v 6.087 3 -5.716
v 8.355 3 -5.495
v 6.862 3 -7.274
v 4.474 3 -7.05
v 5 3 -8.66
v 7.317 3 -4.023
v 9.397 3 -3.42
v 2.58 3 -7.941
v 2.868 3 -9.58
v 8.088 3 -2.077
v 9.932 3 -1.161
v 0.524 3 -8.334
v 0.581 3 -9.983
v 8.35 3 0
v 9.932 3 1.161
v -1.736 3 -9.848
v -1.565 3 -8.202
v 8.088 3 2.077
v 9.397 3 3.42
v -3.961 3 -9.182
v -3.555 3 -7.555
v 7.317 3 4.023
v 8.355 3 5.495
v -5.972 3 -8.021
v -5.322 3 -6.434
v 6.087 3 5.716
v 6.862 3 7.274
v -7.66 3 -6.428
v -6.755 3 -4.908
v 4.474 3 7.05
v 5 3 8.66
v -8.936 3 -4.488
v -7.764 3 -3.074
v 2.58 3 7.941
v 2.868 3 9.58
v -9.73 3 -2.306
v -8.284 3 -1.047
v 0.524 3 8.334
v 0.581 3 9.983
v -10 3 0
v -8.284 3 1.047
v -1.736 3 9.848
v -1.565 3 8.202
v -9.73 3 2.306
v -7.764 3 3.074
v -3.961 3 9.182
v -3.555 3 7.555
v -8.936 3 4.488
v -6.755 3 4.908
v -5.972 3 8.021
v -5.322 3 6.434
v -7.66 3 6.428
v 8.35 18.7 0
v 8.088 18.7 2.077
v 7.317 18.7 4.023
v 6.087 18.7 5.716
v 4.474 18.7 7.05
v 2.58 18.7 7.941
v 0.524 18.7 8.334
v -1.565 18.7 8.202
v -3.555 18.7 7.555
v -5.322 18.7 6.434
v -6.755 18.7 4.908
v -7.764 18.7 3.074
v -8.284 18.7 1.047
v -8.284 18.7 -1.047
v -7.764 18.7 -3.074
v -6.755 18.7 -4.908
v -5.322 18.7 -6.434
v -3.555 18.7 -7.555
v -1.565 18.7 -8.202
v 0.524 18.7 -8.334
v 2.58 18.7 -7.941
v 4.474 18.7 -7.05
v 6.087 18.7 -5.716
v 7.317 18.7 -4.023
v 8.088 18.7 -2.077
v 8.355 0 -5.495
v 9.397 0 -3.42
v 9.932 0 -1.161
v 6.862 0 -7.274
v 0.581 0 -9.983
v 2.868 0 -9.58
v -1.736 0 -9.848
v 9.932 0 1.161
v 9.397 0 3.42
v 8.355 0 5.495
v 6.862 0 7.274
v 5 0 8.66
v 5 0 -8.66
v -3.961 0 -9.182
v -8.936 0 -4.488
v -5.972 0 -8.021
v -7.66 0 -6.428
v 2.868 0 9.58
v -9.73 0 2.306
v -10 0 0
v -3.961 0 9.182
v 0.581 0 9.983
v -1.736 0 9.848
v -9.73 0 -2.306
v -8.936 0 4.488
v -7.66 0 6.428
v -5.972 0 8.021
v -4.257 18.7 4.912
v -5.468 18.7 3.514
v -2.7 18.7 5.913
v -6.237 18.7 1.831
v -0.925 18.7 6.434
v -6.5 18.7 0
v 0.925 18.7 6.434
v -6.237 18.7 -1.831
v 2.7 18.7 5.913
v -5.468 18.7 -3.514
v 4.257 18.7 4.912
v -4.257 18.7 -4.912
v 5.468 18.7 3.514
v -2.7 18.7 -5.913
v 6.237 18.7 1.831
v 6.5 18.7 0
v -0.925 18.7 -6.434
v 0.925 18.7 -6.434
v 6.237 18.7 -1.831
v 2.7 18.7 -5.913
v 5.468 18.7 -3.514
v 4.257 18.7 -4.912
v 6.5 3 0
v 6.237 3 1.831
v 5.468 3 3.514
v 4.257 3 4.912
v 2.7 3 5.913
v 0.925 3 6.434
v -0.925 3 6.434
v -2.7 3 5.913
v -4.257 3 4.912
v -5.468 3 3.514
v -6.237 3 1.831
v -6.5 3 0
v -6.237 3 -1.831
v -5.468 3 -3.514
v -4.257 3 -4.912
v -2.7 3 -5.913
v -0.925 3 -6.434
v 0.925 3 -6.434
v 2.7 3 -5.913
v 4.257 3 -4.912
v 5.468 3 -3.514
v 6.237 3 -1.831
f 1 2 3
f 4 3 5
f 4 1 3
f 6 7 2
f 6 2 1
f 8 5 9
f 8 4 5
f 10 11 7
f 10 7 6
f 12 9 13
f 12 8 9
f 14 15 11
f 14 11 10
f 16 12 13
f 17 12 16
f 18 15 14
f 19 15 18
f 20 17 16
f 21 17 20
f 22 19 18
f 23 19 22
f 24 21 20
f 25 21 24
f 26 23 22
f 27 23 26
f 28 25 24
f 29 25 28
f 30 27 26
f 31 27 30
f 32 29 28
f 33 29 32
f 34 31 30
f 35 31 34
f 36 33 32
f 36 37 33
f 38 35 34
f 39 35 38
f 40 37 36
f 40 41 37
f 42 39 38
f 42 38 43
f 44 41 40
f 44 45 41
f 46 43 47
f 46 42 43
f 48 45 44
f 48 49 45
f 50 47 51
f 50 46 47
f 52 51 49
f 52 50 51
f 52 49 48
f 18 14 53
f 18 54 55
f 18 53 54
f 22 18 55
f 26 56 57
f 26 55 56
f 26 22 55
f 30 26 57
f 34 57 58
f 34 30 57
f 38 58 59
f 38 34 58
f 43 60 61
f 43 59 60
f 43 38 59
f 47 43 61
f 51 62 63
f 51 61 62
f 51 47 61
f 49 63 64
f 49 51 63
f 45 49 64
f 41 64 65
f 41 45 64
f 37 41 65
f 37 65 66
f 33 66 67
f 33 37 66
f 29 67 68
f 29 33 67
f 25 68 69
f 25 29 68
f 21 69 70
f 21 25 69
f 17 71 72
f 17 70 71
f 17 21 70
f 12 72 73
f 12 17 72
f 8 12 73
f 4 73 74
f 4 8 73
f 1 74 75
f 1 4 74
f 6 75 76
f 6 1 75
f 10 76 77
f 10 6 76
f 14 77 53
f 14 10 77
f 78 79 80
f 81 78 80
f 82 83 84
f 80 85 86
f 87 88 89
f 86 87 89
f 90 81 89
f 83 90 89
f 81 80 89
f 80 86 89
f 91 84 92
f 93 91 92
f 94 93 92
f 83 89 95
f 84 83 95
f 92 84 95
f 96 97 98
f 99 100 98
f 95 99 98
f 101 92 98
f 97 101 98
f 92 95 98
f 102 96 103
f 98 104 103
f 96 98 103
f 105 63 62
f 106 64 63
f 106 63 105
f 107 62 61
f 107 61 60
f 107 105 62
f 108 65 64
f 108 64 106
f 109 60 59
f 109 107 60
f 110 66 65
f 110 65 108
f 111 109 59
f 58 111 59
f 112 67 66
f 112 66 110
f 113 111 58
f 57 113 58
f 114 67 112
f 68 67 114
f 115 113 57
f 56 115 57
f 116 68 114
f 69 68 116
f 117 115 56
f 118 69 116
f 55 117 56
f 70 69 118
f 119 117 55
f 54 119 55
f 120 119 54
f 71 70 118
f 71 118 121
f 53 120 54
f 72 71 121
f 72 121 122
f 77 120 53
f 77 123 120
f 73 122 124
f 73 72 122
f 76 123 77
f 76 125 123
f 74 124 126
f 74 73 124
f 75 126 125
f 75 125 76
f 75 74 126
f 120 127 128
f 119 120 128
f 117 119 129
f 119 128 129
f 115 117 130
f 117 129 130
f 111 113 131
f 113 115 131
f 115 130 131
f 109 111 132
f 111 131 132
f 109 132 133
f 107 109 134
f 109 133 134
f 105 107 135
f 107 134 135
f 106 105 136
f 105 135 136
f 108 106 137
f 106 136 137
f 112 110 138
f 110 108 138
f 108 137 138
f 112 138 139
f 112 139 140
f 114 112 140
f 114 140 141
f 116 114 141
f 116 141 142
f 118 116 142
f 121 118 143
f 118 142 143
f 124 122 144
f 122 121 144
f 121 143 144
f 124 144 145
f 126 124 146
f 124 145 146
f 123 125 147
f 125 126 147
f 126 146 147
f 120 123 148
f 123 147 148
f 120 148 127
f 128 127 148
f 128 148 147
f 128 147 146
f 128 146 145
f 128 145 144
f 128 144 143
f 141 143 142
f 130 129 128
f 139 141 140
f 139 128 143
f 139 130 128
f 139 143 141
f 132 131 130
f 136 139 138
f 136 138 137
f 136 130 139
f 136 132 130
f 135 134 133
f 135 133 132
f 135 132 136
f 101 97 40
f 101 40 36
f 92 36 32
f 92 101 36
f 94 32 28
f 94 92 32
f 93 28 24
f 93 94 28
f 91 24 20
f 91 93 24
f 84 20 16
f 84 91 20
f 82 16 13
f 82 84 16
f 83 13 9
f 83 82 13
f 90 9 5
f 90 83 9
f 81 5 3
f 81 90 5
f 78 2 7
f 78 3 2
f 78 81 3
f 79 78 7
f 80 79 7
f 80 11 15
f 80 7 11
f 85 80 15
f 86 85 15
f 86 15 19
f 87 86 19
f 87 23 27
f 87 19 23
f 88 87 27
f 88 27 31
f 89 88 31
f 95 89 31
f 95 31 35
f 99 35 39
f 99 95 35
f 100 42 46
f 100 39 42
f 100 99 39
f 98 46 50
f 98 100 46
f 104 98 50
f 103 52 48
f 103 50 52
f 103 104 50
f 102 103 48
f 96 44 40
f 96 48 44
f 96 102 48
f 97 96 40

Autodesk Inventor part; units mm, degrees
ref_plane "YZ Plane" through (0, 0, 0) normal (1, 0, 0) x (0, 1, 0)
ref_plane "XZ Plane" through (0, 0, 0) normal (0, 1, 0) x (-1, 0, 0)
ref_plane "XY Plane" through (0, 0, 0) normal (0, 0, 1) x (1, 0, 0)
sketch "Esboço1" plane through (0, 0, 0) normal (0, 1, 0) x (-1, 0, 0)
  circle A0 centre (0, 0) radius 10
  dimension "d0" = 20
extrude "Extrusão1" add sketch "Esboço1" along normal blind 3
sketch "Esboço2" plane through (0, 3, 0) normal (0, 1, 0) x (1, 0, 0)
  circle A0 centre (0, 0) radius 8.35
  circle A1 centre (0, 0) radius 6.5
  dimension "d3" = 16.7
  dimension "d4" = 13
extrude "Extrusão2" add sketch "Esboço2" along normal blind 15.7
properties part number "rosca1"
